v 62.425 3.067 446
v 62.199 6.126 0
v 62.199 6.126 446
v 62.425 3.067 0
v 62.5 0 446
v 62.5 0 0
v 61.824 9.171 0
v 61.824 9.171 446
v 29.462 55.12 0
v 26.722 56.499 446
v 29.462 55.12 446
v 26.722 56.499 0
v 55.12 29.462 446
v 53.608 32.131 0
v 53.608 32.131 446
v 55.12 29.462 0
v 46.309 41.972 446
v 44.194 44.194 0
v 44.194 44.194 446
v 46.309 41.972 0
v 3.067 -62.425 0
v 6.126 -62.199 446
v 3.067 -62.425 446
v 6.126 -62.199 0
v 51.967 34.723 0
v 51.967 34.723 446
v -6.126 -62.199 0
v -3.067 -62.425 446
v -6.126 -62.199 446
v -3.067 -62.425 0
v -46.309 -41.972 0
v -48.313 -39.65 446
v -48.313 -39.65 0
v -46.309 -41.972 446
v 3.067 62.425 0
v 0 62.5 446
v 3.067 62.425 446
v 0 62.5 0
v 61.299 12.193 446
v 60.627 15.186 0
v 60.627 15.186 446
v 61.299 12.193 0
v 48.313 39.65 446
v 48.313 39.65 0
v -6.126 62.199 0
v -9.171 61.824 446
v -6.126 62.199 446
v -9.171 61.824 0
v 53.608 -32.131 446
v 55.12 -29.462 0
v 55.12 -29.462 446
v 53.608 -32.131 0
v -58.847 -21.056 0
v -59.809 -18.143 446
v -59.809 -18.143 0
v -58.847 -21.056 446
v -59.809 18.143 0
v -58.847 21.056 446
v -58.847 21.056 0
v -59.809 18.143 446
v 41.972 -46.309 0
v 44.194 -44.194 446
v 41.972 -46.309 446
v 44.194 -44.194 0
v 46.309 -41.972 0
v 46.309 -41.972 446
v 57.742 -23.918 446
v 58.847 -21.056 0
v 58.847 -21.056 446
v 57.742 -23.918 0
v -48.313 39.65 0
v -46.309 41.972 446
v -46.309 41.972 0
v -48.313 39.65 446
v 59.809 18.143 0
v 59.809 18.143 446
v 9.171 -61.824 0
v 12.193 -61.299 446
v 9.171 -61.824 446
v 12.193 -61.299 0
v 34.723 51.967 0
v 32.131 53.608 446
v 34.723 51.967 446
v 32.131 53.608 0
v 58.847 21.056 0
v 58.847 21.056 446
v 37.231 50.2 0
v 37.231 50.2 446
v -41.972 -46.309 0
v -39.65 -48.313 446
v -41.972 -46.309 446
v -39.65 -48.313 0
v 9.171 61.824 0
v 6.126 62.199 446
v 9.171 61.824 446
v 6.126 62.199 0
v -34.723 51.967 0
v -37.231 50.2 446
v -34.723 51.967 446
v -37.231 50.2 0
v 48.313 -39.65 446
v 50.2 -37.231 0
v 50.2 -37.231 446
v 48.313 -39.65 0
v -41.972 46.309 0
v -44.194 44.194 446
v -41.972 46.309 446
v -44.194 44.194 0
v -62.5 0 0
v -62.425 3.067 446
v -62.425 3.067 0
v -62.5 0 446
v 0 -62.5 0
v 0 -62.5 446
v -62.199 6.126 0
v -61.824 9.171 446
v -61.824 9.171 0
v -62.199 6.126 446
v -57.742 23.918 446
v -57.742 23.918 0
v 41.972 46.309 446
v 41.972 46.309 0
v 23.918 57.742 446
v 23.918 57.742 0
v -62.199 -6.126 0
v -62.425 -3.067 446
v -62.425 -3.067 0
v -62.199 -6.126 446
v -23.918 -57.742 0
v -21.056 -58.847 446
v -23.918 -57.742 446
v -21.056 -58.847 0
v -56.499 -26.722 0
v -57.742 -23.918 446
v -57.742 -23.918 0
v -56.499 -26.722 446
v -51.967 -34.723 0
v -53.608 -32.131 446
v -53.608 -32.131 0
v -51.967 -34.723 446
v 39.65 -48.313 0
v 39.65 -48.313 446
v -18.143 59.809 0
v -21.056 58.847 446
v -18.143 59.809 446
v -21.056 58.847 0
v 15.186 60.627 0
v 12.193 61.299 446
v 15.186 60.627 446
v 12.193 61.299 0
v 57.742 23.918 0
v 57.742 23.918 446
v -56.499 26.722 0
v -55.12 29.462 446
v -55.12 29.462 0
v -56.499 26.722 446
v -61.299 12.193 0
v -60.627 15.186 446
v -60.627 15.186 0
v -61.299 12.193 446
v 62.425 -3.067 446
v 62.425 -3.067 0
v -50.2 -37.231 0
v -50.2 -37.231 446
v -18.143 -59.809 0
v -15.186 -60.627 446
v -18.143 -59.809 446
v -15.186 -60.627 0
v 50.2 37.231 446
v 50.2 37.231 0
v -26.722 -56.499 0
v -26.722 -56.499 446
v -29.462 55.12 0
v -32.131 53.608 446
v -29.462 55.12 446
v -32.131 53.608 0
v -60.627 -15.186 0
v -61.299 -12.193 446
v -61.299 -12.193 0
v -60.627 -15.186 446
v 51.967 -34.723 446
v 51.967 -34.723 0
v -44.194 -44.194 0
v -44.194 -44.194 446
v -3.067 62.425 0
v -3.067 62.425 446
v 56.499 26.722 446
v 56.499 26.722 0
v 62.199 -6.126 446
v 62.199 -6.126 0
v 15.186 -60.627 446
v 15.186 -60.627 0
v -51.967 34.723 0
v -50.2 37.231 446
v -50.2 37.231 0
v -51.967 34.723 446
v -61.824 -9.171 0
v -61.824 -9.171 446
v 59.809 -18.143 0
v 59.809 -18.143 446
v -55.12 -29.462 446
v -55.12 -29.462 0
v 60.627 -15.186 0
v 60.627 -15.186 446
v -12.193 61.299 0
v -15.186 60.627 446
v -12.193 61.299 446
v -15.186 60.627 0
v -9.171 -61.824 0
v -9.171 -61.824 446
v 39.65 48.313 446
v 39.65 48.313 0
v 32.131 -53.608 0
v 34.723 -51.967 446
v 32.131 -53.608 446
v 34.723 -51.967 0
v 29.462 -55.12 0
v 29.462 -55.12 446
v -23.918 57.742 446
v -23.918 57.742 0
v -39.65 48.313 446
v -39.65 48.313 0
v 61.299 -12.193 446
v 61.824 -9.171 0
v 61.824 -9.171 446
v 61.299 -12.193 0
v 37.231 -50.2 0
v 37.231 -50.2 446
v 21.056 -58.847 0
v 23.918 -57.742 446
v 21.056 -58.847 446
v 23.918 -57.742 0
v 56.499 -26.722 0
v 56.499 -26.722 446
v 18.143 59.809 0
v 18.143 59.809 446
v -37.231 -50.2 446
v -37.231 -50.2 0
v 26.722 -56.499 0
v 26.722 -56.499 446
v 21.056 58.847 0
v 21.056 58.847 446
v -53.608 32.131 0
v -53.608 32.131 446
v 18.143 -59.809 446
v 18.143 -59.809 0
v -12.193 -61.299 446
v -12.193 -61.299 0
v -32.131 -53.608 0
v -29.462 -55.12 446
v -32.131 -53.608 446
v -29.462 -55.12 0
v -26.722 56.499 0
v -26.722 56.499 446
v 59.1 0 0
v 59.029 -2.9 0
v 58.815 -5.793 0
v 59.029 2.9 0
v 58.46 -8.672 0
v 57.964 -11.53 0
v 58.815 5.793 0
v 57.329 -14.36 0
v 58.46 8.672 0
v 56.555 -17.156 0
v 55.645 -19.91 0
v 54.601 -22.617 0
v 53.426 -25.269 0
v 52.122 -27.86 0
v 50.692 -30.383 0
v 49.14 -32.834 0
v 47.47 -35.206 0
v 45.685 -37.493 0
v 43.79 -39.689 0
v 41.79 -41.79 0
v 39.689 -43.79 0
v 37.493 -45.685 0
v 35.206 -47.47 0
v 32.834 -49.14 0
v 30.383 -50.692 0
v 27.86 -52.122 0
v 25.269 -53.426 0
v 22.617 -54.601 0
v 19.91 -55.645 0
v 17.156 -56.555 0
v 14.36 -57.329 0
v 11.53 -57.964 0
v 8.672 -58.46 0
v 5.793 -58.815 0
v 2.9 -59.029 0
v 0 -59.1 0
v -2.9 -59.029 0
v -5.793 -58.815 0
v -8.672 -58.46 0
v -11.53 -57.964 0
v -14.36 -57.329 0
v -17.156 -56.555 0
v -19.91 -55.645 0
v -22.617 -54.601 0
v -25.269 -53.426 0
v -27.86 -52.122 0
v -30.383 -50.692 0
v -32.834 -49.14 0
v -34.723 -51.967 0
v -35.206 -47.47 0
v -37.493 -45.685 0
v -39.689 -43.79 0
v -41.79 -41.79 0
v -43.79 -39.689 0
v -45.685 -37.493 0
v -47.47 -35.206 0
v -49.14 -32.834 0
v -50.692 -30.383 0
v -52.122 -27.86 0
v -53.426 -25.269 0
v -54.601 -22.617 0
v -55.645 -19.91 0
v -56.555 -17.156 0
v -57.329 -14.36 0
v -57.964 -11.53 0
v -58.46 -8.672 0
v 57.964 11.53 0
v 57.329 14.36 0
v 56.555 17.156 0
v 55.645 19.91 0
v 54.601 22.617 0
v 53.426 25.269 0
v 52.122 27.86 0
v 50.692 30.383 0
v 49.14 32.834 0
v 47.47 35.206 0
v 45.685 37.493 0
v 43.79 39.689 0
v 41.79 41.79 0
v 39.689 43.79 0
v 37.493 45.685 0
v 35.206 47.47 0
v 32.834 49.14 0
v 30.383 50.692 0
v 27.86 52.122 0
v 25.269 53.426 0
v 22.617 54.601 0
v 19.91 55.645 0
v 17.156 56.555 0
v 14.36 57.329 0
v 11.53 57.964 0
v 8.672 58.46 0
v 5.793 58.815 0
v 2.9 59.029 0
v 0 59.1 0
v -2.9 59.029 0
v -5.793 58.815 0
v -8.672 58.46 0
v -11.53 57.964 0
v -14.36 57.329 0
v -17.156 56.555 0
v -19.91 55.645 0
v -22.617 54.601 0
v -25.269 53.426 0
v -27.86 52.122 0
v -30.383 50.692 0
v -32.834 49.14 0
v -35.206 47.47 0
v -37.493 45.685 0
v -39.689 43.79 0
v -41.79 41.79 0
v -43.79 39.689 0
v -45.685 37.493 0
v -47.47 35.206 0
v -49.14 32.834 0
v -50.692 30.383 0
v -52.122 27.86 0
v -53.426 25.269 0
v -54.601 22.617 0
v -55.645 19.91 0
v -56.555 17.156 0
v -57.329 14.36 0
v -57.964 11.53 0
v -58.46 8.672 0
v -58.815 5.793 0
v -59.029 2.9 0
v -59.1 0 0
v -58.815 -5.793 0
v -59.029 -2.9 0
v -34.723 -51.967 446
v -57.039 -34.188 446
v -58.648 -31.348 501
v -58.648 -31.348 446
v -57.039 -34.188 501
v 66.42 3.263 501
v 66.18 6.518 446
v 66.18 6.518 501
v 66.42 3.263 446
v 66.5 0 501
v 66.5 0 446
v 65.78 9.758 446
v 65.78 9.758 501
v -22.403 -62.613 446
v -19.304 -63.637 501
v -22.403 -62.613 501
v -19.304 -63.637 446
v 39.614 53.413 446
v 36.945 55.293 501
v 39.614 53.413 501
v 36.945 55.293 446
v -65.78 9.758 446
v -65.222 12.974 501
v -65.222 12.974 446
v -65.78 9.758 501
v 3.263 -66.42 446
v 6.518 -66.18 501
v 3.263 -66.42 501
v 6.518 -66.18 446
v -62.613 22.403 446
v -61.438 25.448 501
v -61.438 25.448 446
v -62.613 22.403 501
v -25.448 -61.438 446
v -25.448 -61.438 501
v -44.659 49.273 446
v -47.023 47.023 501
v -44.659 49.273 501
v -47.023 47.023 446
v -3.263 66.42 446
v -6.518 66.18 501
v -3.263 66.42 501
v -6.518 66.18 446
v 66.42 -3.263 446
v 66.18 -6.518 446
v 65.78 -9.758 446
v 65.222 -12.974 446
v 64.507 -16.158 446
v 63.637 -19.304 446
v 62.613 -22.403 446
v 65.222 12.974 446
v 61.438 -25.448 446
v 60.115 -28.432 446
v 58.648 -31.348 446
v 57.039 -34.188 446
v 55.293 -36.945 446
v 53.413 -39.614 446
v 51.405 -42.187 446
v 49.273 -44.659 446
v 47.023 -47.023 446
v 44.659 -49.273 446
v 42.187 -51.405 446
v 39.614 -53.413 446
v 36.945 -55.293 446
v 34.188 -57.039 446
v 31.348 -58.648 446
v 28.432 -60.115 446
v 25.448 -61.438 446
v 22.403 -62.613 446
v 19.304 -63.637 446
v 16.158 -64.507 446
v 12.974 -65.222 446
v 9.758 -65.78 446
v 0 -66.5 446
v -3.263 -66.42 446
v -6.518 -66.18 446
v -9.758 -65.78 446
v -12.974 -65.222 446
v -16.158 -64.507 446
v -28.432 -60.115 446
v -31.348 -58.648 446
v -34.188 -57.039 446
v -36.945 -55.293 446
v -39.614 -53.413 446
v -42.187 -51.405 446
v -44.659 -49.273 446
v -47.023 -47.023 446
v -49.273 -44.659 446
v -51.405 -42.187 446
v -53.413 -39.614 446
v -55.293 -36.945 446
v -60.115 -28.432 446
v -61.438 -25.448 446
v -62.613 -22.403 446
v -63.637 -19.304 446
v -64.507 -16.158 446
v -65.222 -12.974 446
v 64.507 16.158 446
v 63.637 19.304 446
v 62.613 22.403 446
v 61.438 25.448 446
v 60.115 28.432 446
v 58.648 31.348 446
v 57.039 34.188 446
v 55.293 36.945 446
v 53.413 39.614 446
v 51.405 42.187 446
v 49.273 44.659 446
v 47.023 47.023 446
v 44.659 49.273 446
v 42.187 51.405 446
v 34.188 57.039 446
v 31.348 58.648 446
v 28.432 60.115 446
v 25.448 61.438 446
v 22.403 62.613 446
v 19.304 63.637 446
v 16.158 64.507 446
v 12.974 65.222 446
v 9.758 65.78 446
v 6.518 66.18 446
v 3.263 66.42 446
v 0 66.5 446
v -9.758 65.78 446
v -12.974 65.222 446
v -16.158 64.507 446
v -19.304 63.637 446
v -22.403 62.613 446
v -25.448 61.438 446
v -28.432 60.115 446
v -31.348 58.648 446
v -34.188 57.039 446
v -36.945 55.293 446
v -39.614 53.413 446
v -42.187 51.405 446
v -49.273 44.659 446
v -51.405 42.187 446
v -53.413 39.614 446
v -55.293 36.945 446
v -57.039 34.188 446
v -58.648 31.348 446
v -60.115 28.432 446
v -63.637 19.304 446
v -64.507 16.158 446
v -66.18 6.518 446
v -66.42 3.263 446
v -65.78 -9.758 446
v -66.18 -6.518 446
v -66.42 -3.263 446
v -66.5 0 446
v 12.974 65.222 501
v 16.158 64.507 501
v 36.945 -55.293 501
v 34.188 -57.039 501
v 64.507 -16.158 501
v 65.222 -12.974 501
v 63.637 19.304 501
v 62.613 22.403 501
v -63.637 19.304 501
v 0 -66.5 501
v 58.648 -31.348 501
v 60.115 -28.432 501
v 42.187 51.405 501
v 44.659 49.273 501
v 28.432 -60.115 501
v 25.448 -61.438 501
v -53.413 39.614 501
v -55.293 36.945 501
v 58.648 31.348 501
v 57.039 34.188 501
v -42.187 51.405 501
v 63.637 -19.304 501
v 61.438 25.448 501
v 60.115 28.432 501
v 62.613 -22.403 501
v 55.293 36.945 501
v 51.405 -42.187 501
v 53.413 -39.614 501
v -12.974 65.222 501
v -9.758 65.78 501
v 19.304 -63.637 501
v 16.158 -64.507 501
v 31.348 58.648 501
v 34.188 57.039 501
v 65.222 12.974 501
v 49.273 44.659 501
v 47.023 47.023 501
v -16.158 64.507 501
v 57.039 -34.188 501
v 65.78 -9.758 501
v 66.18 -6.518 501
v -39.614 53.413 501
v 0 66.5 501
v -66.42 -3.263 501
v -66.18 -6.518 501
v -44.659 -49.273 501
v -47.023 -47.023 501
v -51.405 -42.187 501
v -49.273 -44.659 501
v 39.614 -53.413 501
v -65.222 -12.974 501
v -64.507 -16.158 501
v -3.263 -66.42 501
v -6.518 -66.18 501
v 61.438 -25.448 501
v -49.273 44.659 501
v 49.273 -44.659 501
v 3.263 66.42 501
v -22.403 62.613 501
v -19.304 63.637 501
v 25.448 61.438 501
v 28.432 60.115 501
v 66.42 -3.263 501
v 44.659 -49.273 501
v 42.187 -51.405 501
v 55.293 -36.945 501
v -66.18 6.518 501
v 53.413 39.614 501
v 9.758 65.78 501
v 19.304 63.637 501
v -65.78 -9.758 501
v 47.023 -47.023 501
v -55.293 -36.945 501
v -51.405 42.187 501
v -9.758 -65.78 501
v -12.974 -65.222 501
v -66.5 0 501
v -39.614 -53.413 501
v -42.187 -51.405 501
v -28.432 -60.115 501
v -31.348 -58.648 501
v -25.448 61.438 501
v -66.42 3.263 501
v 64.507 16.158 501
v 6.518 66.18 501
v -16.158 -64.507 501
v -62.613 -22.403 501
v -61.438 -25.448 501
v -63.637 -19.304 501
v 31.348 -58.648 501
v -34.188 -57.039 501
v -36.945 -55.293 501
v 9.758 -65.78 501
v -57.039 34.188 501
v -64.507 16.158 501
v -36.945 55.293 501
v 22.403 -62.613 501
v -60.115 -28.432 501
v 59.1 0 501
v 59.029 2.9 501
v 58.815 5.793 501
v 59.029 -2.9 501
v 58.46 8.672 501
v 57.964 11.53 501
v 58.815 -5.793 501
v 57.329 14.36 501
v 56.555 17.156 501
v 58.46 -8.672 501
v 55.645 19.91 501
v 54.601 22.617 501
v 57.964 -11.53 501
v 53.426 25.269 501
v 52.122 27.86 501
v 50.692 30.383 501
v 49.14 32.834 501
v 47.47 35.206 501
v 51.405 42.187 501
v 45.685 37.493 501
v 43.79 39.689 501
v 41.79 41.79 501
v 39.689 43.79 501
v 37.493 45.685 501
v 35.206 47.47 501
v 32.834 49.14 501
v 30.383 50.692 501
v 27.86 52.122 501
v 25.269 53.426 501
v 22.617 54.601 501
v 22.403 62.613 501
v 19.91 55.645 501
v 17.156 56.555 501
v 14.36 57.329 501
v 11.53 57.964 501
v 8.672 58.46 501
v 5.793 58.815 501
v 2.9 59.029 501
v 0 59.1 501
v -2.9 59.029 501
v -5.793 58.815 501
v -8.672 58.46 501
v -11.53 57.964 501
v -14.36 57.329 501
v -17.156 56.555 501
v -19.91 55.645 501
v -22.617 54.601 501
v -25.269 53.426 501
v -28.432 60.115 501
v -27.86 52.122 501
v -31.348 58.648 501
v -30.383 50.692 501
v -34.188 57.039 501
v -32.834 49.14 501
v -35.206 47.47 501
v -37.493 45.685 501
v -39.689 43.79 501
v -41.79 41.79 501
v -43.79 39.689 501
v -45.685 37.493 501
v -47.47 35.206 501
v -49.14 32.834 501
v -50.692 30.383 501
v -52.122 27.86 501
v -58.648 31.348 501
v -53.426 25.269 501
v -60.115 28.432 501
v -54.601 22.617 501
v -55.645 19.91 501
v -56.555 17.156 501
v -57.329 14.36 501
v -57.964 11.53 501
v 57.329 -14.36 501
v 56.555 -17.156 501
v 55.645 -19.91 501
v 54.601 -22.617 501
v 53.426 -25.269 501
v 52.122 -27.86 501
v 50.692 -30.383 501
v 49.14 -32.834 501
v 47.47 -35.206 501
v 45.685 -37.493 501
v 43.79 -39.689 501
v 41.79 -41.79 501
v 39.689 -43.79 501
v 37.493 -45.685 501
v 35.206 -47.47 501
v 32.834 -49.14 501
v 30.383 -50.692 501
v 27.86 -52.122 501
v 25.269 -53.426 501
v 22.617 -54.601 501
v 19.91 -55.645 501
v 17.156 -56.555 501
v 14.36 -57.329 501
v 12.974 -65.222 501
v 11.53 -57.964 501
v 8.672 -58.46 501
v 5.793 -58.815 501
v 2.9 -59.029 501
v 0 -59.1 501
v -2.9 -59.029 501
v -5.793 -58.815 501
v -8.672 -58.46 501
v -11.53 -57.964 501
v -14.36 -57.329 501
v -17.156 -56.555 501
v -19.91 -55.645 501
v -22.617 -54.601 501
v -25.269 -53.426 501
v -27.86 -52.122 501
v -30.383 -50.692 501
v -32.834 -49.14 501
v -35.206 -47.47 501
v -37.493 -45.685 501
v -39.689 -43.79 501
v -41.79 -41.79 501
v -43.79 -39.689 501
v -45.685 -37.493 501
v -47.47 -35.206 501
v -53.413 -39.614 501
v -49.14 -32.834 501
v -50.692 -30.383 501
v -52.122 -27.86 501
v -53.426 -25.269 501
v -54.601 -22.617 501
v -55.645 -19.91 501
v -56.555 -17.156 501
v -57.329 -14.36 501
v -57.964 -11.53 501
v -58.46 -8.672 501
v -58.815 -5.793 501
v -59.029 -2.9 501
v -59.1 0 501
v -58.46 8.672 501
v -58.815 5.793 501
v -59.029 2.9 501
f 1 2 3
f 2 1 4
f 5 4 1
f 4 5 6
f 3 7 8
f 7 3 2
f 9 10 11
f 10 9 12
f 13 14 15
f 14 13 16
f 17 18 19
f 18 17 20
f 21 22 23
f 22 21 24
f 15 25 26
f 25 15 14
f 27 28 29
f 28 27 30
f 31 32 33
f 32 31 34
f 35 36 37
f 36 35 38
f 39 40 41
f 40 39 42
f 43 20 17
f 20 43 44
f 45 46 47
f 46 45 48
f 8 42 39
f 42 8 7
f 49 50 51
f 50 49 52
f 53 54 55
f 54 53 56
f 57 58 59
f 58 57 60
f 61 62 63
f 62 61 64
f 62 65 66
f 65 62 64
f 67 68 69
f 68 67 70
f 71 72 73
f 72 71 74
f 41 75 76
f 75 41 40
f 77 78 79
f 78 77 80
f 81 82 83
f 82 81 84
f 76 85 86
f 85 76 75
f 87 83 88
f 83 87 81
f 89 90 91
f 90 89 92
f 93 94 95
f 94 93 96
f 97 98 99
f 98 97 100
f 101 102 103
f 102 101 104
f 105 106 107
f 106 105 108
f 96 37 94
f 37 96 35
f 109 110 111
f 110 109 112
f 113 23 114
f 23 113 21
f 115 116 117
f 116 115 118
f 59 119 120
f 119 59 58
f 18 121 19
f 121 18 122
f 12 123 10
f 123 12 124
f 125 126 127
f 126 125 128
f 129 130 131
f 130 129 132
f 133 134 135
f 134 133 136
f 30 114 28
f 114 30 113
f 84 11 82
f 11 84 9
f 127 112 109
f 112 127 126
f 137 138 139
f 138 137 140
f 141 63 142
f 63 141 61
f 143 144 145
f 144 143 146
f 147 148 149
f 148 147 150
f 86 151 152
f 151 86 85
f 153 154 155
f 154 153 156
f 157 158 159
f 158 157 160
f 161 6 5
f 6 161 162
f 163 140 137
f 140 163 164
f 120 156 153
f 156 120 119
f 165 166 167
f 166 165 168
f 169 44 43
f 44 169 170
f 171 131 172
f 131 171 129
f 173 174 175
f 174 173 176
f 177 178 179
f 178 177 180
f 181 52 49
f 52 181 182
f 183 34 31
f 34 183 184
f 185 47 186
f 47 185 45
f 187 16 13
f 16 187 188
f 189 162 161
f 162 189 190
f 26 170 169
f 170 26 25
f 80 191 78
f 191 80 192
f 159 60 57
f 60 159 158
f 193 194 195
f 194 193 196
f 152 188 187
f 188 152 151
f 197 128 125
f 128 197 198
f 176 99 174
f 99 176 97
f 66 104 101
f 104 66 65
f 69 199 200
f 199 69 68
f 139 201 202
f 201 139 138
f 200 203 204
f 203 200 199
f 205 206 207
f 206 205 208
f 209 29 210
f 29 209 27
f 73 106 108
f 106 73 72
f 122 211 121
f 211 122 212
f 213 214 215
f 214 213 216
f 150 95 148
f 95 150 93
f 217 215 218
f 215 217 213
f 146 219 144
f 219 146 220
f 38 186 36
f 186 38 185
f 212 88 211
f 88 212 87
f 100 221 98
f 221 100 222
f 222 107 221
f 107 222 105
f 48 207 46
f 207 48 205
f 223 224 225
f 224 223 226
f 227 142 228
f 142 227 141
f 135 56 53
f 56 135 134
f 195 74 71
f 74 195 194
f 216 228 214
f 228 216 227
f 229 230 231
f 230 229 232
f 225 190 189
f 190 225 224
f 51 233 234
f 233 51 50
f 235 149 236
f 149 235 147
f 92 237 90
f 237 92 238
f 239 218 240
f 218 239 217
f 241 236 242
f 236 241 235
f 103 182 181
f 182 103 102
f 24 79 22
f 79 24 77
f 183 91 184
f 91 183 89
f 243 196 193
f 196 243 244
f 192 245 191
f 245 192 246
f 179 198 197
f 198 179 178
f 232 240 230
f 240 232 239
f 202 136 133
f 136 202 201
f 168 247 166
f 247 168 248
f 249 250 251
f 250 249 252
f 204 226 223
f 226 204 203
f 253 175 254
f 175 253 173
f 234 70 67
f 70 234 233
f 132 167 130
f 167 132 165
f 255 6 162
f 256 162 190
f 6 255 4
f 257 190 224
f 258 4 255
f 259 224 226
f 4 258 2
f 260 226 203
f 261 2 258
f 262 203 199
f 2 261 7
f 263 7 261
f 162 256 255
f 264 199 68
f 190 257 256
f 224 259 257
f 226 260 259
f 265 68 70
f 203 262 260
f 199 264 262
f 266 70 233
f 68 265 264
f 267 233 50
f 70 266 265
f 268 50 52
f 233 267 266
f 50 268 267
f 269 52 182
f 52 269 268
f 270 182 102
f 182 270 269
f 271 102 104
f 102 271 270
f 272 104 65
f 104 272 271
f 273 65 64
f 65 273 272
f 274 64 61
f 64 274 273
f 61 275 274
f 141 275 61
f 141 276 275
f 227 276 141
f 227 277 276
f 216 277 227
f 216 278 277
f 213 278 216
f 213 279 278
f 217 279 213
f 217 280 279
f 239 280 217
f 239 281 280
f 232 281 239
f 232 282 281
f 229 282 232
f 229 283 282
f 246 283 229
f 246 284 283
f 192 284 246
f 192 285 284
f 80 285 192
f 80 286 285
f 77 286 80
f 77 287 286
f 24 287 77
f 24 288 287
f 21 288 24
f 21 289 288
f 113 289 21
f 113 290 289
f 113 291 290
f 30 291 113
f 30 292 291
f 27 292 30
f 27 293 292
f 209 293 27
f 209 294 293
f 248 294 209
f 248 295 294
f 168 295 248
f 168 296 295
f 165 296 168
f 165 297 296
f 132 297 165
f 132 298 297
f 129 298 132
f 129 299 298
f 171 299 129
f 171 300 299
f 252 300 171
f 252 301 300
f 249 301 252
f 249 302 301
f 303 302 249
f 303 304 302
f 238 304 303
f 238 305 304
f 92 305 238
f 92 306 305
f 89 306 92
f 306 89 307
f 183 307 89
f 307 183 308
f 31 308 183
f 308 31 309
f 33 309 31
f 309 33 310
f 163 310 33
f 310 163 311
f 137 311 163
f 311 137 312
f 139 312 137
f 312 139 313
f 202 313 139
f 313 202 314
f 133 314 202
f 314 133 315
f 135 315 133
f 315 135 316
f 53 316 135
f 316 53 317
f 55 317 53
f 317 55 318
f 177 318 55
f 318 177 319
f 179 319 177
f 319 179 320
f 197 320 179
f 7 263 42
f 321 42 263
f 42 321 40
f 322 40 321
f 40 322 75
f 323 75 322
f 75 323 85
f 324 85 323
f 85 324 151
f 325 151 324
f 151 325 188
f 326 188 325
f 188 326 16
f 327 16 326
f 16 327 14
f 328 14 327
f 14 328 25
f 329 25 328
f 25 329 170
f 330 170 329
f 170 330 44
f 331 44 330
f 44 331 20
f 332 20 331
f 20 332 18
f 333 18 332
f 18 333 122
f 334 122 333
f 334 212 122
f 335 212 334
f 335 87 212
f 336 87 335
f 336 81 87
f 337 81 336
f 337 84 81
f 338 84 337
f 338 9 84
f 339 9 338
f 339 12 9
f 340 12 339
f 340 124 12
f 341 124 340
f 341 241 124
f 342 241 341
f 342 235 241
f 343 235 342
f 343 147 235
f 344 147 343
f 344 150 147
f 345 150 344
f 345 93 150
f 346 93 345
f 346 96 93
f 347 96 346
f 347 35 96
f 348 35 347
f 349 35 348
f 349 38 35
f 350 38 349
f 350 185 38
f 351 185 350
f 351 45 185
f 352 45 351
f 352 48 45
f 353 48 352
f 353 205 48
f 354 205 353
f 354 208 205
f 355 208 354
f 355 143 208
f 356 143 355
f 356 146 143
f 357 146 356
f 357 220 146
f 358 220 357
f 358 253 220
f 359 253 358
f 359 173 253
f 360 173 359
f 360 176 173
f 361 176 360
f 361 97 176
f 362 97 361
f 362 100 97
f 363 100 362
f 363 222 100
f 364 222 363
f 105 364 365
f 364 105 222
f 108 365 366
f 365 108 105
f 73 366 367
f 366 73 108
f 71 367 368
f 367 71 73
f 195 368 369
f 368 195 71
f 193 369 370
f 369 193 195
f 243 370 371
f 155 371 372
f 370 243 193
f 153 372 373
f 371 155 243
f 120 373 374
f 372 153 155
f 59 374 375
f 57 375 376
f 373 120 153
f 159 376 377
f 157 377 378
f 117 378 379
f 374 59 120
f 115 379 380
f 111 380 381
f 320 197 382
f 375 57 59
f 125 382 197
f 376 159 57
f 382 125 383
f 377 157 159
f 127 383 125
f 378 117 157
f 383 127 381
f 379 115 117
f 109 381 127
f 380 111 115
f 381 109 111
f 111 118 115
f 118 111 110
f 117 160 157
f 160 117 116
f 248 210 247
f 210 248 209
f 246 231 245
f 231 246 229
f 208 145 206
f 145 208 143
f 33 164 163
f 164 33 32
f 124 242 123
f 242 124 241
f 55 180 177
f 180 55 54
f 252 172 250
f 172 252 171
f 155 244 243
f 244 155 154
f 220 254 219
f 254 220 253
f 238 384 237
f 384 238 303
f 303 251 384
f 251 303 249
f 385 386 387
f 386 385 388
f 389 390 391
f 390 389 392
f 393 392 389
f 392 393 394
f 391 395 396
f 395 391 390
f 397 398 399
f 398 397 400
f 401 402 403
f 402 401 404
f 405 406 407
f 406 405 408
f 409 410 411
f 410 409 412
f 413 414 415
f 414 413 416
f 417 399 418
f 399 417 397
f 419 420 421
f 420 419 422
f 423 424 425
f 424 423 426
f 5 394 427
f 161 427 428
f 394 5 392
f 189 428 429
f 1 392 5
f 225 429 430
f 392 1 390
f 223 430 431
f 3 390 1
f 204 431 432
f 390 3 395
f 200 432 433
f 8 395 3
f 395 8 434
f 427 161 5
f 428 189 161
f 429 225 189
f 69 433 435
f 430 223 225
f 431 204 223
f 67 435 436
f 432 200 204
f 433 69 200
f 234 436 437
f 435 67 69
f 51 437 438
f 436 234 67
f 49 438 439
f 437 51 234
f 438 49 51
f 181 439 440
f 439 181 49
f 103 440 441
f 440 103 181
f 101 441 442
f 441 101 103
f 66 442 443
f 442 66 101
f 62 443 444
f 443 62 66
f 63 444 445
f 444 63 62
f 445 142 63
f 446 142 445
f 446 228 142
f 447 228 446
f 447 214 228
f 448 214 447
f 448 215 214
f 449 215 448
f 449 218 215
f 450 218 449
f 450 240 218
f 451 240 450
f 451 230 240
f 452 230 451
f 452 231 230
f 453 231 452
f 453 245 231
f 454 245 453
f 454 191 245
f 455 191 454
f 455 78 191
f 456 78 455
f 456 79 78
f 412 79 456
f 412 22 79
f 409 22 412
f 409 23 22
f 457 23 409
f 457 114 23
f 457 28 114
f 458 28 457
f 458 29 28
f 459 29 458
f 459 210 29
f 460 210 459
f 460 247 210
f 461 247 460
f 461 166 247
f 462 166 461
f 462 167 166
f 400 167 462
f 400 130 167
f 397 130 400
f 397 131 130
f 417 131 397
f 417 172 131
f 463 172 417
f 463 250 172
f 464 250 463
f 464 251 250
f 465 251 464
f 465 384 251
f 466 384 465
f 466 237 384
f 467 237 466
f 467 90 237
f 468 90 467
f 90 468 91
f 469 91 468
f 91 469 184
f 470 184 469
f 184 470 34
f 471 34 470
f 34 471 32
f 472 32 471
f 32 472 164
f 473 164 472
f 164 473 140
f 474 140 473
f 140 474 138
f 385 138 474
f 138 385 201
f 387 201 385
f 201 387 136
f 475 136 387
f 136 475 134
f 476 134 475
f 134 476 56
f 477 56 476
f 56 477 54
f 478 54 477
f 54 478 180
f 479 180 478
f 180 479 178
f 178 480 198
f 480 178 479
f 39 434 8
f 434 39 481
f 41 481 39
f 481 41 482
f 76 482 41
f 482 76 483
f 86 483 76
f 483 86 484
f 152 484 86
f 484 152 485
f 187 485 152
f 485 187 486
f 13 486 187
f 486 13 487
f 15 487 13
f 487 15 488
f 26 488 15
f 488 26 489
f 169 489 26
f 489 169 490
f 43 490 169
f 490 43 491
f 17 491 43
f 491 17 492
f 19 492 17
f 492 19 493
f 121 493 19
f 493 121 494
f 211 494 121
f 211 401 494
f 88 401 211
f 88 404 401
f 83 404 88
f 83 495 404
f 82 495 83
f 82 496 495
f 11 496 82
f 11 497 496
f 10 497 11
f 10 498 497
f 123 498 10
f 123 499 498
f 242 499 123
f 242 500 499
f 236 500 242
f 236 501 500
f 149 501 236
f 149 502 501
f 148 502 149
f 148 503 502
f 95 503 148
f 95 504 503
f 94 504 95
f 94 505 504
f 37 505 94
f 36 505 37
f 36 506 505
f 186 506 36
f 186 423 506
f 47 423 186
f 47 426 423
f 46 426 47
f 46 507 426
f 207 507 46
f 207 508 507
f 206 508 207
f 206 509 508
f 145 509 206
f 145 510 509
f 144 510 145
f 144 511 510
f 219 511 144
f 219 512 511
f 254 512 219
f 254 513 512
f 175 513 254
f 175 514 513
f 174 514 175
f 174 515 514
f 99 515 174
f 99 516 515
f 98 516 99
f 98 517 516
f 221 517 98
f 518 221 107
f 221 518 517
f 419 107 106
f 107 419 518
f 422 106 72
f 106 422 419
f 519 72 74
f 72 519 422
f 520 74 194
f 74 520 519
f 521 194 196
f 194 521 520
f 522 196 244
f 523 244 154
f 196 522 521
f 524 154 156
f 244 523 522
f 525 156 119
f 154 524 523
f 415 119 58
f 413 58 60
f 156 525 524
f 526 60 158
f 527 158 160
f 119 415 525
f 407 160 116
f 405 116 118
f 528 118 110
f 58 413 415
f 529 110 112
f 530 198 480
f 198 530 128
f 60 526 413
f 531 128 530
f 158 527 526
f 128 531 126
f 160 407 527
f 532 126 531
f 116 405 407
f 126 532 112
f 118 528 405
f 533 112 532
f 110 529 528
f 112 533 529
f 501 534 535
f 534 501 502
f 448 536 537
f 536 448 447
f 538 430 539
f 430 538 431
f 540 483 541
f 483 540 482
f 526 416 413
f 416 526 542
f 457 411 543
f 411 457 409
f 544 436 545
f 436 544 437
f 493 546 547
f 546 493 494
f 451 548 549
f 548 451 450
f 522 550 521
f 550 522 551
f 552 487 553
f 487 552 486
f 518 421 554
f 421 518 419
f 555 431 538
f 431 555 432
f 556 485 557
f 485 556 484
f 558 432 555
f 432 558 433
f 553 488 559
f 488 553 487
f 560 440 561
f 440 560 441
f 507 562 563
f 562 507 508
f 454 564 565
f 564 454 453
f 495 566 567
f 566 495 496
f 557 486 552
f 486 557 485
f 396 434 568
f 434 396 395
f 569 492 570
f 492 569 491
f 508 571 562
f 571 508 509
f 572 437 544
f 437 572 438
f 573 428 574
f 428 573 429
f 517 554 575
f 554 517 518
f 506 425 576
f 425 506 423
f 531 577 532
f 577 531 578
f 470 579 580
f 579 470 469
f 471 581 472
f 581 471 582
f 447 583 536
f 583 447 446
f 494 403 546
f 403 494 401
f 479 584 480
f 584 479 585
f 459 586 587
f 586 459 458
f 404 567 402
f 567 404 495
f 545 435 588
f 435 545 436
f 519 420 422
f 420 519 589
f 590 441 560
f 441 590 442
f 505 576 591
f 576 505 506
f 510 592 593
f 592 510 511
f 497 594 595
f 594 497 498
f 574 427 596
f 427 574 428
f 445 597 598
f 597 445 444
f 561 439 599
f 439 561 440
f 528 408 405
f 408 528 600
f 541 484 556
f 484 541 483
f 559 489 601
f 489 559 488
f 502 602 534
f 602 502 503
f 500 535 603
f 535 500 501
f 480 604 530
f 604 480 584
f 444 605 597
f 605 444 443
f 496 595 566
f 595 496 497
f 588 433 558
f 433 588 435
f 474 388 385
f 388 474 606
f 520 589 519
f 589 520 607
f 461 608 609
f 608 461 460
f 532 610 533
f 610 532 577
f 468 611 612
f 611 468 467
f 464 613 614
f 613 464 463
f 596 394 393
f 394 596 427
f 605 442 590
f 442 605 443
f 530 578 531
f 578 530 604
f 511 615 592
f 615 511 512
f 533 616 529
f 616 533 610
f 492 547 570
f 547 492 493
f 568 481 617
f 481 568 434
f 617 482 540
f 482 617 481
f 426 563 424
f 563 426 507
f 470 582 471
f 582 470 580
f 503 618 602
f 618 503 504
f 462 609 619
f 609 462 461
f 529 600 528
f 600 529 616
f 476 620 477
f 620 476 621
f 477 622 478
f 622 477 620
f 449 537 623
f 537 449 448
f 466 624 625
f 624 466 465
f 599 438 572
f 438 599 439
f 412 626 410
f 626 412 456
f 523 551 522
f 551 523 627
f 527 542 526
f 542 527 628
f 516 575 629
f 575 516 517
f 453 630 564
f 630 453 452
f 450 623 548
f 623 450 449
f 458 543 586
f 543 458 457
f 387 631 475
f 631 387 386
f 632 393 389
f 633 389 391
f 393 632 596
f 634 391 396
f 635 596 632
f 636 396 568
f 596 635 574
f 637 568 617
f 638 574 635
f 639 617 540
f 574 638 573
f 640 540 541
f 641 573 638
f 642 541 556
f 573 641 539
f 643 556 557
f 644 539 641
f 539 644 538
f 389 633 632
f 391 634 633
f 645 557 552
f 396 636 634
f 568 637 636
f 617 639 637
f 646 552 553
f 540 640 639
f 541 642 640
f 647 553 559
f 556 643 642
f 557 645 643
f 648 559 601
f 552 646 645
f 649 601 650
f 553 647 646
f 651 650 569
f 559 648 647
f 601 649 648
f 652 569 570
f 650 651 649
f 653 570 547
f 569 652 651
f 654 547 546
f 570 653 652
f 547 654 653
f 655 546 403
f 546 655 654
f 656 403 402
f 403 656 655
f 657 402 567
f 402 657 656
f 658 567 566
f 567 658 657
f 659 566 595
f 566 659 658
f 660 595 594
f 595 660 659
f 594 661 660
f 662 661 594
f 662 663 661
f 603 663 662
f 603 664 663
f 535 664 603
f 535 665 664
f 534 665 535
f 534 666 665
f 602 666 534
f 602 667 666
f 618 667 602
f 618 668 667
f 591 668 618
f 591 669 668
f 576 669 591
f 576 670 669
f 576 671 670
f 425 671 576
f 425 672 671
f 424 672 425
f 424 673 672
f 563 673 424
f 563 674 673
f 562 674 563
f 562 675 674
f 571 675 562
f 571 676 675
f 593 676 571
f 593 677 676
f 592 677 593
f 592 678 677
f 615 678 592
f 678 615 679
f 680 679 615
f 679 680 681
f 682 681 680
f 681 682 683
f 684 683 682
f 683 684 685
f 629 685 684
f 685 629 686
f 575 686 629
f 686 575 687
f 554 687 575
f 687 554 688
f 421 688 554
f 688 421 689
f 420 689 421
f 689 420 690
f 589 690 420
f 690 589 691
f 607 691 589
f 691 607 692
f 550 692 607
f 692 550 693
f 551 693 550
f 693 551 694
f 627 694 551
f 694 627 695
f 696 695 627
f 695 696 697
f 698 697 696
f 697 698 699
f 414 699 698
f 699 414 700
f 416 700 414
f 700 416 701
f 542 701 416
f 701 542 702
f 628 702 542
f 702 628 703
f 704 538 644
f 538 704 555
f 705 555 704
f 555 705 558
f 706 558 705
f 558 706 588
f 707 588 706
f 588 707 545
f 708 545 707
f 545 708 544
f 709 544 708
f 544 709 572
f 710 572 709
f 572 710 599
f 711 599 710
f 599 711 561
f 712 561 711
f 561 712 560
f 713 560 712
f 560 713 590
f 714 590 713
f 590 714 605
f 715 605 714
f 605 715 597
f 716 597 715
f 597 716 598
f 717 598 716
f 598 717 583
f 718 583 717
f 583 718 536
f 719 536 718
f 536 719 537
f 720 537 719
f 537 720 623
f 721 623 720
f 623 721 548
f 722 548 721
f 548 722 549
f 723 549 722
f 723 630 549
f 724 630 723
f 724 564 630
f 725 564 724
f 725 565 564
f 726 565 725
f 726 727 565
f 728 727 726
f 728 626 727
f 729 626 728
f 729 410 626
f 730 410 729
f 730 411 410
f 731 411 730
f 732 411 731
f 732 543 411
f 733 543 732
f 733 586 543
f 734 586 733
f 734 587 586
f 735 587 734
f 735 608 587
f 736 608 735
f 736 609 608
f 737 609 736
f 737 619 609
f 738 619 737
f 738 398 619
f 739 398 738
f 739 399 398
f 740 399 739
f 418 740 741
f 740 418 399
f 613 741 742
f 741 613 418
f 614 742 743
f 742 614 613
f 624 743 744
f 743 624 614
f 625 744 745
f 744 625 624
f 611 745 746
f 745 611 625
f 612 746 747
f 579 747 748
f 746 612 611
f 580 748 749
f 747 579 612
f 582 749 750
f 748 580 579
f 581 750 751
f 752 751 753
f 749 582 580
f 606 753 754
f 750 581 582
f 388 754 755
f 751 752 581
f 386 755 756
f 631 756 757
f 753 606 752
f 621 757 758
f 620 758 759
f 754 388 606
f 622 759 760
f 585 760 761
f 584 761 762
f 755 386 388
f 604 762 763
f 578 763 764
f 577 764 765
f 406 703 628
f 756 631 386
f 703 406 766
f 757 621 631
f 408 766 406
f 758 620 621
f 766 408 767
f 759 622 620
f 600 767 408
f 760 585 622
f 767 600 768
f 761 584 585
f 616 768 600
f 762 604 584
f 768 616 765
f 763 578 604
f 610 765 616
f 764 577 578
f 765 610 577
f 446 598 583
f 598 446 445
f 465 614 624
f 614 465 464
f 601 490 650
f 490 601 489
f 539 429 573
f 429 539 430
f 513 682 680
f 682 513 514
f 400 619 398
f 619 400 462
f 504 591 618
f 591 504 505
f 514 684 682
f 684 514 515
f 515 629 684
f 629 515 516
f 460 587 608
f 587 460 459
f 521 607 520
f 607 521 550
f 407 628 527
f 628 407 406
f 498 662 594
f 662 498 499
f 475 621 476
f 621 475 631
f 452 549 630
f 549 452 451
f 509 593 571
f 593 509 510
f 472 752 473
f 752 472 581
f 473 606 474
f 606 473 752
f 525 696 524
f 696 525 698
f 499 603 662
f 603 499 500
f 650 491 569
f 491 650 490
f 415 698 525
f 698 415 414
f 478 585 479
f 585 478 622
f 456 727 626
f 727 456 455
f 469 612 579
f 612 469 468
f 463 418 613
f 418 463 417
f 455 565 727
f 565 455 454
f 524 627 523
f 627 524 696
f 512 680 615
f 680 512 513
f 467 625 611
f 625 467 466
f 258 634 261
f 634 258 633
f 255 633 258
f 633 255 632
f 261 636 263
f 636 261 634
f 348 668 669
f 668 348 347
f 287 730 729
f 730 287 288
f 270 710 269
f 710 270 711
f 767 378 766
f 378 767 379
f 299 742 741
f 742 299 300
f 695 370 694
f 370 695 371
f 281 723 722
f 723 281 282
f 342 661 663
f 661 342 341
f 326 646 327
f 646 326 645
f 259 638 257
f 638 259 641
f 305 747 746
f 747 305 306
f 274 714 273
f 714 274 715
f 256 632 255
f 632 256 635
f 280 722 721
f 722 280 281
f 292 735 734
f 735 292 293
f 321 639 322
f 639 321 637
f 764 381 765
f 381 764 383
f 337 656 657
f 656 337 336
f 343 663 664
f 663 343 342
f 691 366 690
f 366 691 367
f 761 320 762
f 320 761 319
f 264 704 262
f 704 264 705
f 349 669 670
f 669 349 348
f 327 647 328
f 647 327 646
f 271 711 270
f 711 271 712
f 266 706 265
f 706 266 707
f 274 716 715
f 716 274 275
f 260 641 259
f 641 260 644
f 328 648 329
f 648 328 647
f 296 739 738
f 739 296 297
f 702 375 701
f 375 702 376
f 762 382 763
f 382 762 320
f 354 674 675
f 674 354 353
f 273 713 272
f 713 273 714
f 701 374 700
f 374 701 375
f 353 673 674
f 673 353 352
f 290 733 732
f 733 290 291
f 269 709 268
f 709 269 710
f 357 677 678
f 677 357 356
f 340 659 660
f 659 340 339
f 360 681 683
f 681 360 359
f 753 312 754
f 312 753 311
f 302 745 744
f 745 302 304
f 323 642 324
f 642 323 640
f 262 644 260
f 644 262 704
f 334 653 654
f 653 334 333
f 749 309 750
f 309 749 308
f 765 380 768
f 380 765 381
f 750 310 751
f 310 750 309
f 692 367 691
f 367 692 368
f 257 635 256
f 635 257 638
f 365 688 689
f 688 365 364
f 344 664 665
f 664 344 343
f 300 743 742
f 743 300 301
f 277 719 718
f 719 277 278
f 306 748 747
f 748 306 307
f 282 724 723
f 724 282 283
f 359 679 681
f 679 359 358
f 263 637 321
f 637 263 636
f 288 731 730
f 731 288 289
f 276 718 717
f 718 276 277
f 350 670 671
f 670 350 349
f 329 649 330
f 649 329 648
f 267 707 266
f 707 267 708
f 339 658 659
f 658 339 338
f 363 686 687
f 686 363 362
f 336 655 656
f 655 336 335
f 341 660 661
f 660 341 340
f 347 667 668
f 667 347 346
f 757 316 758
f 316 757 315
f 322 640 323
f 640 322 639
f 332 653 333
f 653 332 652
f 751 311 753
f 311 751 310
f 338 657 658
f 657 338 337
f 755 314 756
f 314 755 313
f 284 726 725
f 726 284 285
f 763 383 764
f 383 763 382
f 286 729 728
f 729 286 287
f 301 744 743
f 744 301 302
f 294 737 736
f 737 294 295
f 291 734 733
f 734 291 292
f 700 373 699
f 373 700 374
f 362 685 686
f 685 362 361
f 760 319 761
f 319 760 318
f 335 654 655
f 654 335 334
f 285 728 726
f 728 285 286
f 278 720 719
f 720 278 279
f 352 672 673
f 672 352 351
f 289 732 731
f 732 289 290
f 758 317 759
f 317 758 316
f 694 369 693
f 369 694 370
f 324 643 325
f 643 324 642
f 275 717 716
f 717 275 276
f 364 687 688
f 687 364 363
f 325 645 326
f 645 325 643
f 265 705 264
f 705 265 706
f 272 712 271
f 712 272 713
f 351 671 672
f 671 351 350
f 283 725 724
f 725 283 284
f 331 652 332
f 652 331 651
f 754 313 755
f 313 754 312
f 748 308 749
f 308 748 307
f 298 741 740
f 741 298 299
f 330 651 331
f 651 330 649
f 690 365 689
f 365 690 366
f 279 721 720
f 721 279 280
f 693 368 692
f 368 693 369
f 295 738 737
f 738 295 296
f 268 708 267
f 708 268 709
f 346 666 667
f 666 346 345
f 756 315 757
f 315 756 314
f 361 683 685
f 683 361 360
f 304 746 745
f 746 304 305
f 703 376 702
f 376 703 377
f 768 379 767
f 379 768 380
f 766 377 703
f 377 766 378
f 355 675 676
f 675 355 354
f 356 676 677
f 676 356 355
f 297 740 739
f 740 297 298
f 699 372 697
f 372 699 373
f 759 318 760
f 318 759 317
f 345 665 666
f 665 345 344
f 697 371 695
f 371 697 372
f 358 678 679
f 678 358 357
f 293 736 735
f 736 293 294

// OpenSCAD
// HT 125 pipe 500 mm (connected, visible, manifold)

// Parameters
nominal_diameter_mm = 125; //[60:250:1]
length_mm = 500; //[250:1000:1]
wall_thickness_mm = 3.2; //[1.6:6.4:0.1]
include_end_fitting = 1; //[0:1:1]
center = 0; //[0:1:1]
fitting_length_mm = 55; //[25:110:1]
fitting_od_extra_mm = 8; //[3:20:0.5]
fitting_wall_extra_mm = 1.8; //[0.5:4:0.1]
connection_overlap_mm = 1; //[0.5:2:0.1]
bore_clearance_mm = 0.2; //[0:0.6:0.05]

// Quality
$fn = 128;

// Robust epsilon
eps = 0.02;

// Derived radii (ensure valid)
outer_r = max(0.1, nominal_diameter_mm/2);
inner_r = max(0.1, outer_r - wall_thickness_mm);

// Fitting OD is larger by fitting_od_extra_mm (diameter), so radius increases by half
fitting_outer_r = max(outer_r + 0.1, outer_r + fitting_od_extra_mm/2);

// Fitting wall is thicker by fitting_wall_extra_mm
fitting_inner_r = max(0.1, fitting_outer_r - (wall_thickness_mm + fitting_wall_extra_mm));

// Clamp overlap to sensible range
overlap = min(connection_overlap_mm, fitting_length_mm - eps);

// HT Pipe - ONE connected solid (outer union, inner difference)
module ht_pipe() {
  color([0.85, 0.85, 0.8])
  difference() {
    // OUTER SOLID
    union() {
      // Main pipe outer
      cylinder(h=length_mm, r=outer_r, center=false);

      // End fitting outer (connected by computed overlap)
      if (include_end_fitting) {
        translate([0, 0, length_mm - fitting_length_mm + overlap])
          cylinder(h=fitting_length_mm, r=fitting_outer_r, center=false);
      }
    }

    // INNER VOID (continuous bore through entire part)
    // Use the smallest inner radius so the void always passes through both sections.
    void_r = max(0.1, min(inner_r, fitting_inner_r) - bore_clearance_mm);
    void_h = length_mm + (include_end_fitting ? fitting_length_mm : 0) + 2*bore_clearance_mm + 4*eps;

    translate([0, 0, -bore_clearance_mm - 2*eps])
      cylinder(h=void_h, r=void_r, center=false);
  }
}

// Assembly
if (center)
  translate([0, 0, -length_mm/2]) ht_pipe();
else
  ht_pipe();
